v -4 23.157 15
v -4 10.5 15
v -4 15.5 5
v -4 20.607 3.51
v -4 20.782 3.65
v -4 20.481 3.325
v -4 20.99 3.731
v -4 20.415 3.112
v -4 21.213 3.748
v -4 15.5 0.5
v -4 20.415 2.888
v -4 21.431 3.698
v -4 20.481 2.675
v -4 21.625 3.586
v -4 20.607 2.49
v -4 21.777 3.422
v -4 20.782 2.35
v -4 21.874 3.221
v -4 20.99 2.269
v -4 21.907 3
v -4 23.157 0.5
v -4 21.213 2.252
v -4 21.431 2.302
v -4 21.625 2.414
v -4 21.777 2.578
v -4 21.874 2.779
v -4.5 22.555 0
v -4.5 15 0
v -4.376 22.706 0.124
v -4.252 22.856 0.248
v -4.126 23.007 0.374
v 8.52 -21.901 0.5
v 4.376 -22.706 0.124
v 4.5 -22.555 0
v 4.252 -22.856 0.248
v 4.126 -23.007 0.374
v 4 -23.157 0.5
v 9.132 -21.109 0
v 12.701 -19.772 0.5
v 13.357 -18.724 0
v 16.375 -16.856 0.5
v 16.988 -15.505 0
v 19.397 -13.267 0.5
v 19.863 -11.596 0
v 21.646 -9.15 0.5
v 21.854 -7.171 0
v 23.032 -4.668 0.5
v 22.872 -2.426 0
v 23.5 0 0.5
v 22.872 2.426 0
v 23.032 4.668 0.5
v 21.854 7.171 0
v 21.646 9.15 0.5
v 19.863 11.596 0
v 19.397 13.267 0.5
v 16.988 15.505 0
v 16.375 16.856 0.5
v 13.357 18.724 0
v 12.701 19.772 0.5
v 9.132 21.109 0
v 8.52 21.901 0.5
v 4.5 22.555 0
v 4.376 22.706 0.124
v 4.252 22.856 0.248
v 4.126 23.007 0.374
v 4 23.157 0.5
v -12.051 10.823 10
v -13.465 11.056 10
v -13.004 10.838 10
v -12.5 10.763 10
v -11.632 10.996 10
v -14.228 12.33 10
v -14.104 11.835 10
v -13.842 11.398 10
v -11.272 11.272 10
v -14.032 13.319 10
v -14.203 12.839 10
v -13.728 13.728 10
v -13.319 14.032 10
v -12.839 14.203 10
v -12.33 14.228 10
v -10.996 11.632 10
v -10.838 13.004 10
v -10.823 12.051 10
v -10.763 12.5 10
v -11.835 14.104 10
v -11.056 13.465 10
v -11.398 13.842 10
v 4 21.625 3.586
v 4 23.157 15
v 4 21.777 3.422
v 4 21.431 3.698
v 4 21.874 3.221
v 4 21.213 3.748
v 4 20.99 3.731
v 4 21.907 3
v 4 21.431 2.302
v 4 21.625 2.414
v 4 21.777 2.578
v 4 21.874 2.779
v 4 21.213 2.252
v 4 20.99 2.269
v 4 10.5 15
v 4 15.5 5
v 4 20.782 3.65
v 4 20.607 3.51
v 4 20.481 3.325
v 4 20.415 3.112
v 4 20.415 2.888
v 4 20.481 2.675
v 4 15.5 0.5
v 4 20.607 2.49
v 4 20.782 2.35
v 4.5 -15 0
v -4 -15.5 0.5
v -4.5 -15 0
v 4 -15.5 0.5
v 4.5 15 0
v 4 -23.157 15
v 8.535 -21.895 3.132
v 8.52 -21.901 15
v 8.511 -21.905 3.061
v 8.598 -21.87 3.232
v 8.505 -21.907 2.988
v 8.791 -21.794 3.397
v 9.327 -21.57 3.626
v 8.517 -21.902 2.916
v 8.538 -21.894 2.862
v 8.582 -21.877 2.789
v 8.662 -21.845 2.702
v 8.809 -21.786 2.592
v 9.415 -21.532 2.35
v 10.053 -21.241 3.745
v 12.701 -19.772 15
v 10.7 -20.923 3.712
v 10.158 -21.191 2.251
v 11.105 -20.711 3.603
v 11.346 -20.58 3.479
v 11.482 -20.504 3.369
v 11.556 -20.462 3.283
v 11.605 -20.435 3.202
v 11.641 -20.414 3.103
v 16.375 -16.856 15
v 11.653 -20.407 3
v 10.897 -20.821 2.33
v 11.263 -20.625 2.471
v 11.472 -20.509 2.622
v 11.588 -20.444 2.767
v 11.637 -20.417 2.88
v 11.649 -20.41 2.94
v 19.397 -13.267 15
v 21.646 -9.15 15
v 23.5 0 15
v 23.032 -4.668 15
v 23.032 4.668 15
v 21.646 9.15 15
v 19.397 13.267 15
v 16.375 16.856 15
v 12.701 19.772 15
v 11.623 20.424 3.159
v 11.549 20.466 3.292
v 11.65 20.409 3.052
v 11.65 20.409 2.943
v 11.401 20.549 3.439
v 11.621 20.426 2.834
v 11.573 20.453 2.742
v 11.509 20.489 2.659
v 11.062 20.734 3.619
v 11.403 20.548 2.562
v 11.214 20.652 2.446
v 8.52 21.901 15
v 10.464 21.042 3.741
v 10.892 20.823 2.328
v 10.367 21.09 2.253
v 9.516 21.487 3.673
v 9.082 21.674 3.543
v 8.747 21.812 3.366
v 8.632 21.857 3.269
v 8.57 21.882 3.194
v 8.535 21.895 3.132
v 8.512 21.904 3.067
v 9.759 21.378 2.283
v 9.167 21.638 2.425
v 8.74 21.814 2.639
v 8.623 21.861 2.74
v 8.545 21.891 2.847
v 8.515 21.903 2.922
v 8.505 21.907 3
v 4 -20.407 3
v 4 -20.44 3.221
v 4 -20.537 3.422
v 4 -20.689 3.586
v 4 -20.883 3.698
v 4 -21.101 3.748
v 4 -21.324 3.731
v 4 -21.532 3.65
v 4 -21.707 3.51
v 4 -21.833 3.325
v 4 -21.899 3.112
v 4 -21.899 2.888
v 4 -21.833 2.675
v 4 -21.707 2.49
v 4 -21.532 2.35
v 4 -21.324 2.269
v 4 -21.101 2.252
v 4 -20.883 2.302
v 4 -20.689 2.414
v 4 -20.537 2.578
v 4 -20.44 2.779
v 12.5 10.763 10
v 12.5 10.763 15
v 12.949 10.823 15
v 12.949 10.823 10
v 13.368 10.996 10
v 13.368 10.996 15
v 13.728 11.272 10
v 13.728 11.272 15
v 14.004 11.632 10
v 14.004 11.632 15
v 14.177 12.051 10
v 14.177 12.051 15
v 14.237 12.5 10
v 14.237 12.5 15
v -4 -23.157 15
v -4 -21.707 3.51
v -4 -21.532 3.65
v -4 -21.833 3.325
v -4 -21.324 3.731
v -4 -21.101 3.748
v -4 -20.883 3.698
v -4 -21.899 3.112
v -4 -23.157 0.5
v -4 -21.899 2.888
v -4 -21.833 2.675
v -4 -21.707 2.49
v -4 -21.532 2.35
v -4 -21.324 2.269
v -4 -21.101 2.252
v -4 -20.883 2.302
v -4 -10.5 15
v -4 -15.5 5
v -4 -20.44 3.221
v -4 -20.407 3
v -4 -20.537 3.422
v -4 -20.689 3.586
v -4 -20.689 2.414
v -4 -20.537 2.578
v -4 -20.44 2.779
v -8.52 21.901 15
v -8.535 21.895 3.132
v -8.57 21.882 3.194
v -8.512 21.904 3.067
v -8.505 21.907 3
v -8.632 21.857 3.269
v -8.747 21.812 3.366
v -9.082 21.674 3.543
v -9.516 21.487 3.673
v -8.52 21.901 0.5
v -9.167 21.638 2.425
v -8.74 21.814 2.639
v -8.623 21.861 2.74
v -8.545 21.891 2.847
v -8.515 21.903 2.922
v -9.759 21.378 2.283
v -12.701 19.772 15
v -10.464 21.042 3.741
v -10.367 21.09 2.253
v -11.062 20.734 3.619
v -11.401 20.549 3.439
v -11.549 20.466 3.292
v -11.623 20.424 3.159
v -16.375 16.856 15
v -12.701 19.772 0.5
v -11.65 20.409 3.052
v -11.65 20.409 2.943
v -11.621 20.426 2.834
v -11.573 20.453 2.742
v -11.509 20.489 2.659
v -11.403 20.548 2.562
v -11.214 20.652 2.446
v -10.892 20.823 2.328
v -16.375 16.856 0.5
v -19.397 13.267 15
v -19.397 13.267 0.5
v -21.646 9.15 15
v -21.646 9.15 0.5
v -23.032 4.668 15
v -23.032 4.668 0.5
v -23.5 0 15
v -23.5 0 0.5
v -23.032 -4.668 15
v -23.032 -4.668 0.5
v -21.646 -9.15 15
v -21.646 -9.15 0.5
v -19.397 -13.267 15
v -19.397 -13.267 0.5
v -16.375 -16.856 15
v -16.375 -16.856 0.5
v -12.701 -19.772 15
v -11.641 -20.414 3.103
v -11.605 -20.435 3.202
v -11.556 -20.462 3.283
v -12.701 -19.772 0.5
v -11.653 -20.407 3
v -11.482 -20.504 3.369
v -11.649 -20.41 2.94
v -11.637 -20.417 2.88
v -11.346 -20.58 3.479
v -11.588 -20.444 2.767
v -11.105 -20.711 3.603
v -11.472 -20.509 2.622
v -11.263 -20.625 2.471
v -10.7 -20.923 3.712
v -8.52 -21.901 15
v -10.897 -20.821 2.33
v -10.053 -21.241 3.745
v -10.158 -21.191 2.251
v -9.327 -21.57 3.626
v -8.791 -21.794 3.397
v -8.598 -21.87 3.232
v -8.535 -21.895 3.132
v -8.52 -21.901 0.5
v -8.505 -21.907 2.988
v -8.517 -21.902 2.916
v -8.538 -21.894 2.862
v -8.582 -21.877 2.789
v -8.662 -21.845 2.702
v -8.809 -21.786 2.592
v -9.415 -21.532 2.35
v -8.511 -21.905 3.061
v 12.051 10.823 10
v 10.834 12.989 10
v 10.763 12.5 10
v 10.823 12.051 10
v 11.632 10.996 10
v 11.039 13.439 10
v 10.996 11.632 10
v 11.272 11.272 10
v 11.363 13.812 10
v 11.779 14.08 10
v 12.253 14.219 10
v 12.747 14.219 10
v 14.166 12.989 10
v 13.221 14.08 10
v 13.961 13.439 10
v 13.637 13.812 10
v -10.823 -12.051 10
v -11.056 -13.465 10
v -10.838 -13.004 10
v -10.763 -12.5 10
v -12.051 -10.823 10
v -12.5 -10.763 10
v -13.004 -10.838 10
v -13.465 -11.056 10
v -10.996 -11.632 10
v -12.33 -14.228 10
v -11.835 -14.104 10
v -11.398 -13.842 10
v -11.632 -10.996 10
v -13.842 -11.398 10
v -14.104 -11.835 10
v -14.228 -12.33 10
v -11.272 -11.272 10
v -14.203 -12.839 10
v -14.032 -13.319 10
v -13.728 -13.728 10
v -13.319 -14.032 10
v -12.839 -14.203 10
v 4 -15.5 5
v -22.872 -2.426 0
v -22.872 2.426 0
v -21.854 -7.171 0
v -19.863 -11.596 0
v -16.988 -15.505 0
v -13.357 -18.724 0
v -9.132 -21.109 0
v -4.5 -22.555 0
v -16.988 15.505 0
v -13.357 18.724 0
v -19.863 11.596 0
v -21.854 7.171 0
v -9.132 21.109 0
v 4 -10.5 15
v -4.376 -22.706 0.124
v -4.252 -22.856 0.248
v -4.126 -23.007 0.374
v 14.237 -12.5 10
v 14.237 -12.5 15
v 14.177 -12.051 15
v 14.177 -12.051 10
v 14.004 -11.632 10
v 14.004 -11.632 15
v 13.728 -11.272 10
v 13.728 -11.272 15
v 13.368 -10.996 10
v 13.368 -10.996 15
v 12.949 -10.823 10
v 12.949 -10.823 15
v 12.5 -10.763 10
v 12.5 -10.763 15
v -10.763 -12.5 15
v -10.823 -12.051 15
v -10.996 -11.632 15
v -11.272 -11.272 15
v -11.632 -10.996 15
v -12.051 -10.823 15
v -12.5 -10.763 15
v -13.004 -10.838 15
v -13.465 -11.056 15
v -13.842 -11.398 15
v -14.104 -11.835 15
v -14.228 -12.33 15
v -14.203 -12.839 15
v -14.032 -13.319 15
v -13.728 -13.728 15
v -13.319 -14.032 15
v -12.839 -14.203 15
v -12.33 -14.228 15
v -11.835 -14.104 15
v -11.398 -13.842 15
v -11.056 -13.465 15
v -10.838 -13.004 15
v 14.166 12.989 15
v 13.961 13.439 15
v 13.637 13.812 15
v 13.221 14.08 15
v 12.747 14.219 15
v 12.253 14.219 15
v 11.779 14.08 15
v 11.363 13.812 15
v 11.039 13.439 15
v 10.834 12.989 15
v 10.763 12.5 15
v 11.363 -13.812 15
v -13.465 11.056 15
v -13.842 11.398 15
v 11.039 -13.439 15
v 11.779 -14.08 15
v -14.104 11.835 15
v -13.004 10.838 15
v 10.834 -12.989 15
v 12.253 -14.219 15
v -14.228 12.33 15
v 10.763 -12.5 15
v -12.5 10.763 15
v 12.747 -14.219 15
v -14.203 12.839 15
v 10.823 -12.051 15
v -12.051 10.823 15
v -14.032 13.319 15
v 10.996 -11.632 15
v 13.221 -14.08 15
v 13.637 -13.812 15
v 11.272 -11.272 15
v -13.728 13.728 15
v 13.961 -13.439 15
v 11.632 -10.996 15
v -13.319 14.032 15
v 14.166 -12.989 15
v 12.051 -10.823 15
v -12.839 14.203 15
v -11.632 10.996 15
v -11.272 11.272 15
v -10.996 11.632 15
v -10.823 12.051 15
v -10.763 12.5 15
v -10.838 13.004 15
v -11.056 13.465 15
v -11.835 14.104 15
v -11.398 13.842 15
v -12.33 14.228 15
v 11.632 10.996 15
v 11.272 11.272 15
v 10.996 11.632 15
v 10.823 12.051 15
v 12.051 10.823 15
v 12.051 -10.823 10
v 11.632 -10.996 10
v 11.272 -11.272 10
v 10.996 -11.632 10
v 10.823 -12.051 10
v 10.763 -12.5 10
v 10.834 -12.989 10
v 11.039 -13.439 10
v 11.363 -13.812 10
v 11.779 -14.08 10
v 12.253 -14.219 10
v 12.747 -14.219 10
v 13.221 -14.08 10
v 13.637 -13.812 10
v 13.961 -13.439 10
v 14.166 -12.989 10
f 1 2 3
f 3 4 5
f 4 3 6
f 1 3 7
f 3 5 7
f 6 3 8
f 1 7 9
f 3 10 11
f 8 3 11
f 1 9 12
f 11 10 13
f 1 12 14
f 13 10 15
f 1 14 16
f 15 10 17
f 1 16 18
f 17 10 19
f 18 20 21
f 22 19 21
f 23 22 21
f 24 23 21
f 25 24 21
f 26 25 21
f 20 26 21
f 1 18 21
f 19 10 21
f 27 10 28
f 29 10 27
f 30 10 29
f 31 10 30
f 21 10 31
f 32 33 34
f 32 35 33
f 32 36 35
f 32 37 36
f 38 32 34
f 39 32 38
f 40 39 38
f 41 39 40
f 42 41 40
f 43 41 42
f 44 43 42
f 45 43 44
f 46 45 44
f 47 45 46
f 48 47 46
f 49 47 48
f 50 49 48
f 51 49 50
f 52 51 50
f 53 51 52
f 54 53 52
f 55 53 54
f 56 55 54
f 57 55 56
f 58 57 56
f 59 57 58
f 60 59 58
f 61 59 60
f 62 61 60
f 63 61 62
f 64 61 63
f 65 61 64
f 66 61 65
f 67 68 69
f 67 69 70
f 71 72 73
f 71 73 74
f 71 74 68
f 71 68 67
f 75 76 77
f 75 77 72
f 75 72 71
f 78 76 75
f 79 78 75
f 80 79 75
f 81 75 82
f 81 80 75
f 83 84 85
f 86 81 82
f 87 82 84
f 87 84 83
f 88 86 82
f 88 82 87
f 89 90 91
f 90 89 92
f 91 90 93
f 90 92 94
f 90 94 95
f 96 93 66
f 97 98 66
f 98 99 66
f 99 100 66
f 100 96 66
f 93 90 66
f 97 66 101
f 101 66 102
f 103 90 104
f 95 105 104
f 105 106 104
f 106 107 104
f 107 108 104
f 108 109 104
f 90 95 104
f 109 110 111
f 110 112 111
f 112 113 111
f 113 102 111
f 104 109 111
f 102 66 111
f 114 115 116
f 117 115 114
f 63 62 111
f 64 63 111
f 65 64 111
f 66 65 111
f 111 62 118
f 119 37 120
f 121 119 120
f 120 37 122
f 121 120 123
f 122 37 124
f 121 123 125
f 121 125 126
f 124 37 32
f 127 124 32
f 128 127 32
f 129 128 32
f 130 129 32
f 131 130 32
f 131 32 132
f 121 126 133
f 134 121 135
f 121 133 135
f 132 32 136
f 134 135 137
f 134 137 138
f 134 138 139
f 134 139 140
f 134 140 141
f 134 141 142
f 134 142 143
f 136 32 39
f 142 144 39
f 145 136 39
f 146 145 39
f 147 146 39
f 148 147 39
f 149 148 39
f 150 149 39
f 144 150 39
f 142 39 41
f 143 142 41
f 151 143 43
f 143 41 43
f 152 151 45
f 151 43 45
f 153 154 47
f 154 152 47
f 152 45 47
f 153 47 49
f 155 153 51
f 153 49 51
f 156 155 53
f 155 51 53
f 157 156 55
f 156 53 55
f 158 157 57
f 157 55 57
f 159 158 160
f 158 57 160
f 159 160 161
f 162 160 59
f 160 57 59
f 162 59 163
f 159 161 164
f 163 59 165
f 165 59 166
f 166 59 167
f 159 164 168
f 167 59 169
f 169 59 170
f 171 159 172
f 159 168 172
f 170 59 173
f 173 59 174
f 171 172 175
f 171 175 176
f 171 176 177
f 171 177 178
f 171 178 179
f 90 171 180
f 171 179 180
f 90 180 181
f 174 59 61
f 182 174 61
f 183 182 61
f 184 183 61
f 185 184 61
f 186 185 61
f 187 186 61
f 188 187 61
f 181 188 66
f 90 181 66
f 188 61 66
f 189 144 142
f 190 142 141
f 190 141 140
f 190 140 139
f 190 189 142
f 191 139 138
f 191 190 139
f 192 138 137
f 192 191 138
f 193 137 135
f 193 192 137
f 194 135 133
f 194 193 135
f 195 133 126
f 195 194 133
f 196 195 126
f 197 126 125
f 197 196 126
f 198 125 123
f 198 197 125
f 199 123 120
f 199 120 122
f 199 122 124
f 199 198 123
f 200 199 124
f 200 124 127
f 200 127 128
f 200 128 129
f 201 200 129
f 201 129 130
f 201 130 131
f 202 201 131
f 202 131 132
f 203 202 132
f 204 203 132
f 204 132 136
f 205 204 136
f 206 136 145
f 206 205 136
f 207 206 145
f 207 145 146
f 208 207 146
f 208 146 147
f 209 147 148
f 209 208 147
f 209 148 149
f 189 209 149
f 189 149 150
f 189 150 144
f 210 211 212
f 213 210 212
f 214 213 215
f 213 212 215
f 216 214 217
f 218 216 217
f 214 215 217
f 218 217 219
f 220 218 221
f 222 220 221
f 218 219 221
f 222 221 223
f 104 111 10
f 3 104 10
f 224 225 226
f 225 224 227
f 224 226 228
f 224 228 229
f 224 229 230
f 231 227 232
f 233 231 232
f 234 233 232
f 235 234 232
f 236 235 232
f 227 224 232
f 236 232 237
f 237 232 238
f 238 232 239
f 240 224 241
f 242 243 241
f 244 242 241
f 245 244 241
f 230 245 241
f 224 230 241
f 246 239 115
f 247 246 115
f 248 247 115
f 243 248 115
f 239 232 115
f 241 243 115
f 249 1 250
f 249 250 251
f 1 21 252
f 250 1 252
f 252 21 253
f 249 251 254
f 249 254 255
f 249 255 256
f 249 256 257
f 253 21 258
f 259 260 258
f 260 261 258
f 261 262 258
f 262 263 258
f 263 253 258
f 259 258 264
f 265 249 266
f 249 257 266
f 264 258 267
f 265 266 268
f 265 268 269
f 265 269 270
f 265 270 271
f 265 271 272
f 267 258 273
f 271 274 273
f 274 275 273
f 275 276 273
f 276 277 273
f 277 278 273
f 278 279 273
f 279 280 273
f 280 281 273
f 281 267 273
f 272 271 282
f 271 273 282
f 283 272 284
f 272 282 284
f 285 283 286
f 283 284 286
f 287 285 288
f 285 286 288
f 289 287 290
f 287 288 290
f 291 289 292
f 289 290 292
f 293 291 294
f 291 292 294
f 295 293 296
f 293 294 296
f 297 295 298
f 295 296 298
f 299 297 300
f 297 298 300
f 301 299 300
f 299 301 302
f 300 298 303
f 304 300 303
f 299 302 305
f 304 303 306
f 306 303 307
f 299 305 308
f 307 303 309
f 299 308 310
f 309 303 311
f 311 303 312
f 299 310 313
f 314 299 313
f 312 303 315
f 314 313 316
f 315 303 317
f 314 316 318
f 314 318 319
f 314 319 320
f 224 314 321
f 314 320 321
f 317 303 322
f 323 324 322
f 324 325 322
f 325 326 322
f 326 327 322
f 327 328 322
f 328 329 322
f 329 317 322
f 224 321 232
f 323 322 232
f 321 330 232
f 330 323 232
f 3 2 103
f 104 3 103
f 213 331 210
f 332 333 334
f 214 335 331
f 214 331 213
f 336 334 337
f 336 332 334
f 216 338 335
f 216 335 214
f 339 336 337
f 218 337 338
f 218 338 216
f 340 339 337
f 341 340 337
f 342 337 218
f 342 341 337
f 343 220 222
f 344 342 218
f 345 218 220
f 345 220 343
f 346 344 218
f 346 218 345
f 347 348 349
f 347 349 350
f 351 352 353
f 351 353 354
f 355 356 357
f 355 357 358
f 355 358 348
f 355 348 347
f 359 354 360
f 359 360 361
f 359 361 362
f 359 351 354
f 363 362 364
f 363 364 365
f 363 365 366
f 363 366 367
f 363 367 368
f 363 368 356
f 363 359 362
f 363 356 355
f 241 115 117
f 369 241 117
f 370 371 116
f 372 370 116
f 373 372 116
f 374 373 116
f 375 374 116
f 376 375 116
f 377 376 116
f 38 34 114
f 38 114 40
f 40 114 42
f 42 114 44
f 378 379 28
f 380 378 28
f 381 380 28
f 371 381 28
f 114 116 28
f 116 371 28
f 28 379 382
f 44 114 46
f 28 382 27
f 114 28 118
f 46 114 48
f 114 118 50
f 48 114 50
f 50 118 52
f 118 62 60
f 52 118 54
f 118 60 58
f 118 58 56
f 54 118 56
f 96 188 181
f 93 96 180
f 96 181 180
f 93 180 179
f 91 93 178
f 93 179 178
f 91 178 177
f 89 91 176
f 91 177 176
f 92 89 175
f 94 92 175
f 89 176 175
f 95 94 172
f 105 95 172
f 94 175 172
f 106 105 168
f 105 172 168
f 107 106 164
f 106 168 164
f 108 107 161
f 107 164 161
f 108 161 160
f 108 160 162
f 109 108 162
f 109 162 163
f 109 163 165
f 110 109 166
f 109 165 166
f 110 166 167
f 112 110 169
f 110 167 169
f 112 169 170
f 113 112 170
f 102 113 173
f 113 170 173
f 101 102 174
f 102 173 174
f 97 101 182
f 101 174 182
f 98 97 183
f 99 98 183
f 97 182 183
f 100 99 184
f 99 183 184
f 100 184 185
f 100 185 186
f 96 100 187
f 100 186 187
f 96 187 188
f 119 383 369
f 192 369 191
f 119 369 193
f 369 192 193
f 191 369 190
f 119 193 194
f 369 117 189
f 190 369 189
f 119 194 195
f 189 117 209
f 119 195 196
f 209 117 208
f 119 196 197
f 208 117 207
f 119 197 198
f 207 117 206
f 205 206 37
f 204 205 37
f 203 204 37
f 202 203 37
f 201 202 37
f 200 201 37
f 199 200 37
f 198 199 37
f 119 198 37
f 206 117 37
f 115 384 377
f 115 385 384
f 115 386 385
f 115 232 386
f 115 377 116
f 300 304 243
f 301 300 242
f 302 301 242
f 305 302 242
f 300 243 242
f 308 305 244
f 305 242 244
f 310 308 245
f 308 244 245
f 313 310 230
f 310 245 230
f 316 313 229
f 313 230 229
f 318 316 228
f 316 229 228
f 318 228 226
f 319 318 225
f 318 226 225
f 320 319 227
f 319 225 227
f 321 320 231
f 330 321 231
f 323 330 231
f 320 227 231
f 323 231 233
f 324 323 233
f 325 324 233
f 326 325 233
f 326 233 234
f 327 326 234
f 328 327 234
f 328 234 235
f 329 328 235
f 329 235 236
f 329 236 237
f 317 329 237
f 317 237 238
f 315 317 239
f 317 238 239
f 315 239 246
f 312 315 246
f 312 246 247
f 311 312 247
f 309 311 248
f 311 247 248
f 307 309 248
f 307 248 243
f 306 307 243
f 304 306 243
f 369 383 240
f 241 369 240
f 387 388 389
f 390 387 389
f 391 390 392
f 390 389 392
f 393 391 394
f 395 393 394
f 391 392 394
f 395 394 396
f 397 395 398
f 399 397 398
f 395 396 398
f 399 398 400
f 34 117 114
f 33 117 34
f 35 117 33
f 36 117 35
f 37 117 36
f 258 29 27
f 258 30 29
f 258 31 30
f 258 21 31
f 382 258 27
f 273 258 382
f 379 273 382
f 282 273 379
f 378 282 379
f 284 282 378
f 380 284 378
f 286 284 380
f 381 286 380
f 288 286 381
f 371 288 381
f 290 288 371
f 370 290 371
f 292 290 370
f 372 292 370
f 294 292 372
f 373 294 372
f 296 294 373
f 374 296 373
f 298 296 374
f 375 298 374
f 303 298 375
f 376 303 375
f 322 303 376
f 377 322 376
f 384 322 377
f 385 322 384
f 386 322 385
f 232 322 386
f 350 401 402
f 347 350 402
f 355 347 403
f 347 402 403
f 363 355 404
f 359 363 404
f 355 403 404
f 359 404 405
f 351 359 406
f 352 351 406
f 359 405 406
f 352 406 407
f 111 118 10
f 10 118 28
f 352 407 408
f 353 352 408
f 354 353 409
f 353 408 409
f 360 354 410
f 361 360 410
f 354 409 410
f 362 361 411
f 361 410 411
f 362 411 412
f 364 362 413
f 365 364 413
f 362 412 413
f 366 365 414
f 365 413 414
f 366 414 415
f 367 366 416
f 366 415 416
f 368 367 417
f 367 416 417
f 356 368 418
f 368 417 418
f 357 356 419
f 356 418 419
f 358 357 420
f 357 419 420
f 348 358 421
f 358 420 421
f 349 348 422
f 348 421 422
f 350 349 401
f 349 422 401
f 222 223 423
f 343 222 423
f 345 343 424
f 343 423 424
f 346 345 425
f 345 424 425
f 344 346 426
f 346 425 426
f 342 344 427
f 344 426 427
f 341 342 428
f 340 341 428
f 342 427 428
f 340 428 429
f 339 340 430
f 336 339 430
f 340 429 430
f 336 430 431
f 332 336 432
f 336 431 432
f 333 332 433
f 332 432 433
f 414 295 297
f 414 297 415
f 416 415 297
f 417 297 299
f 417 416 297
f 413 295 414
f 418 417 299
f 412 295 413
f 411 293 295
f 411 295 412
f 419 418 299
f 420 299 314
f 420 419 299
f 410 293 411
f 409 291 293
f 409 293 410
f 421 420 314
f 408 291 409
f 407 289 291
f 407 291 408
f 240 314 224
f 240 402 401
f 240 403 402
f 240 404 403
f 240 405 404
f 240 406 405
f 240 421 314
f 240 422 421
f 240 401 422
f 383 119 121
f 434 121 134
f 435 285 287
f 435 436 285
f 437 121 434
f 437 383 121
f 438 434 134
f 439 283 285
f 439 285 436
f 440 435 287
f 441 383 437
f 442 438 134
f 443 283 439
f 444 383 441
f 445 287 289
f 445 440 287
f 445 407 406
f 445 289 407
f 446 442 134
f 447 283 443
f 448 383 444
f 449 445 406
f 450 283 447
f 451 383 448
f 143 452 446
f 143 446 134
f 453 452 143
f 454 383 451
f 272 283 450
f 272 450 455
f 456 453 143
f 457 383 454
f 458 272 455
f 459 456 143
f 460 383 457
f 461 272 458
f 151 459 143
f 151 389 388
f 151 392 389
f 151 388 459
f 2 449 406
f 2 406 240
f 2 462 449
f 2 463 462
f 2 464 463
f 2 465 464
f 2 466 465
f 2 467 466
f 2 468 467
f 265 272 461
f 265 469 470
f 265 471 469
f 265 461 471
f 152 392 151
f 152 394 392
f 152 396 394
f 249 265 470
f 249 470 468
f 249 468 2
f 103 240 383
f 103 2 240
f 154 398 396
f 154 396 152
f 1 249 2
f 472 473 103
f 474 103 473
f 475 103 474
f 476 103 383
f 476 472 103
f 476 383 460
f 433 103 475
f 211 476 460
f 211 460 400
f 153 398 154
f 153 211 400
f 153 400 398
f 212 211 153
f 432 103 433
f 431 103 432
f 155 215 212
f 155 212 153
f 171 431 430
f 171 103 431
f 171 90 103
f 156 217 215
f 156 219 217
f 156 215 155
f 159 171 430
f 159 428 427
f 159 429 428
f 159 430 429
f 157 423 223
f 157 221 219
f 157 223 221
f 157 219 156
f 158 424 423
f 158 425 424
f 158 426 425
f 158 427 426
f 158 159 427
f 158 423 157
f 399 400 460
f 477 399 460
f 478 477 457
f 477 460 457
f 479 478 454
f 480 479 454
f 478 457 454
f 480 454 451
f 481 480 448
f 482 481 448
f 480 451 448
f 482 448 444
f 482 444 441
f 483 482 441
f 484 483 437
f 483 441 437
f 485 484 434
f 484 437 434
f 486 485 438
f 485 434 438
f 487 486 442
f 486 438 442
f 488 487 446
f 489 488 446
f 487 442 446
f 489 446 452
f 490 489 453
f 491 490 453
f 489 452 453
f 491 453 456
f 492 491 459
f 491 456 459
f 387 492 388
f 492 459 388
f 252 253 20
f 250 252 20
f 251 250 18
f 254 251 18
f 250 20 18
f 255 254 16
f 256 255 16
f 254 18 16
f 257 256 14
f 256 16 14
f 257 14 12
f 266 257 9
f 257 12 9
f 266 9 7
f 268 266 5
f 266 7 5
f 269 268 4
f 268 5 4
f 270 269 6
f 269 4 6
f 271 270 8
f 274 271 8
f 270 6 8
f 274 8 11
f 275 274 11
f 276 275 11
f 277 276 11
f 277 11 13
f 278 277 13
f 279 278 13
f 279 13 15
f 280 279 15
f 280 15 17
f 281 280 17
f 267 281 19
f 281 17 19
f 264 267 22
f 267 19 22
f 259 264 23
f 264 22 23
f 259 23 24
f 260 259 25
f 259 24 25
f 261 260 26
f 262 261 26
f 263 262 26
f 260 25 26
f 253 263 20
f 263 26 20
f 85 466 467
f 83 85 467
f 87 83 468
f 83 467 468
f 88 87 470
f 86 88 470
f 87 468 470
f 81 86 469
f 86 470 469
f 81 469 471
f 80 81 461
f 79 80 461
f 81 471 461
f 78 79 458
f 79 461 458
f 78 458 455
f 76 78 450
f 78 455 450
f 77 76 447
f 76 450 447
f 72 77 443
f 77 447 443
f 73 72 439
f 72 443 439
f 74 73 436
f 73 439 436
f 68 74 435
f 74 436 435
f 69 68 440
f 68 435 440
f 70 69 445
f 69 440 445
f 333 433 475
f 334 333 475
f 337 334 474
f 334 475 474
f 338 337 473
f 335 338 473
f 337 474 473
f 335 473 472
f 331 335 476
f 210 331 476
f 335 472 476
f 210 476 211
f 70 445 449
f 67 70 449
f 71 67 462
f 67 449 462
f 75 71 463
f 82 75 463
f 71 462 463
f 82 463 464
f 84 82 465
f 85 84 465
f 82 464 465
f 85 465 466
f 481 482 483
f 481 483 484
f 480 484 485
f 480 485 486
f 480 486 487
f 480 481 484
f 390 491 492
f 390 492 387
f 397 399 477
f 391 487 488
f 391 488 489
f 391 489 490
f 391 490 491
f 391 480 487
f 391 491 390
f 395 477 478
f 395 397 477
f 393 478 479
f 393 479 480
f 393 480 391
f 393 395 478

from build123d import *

# Parameters (mm, degrees)
F0_R      = 23.5
F1_DEPTH  = 15
F3_DEPTH  = 25
F4_SIZE2  = 5
F4_SIZE   = 10
F5_SIZE2  = 5
F5_SIZE   = 10
F7_R      = 0.75
F8_DEPTH  = 12.5
F11_DEPTH = 5
F12_SIZE  = 0.5


with BuildPart() as f1:
    # F0 (on Top) → F1 (new body)
    with BuildSketch(Plane.XY):
        Circle(F0_R)
    extrude(amount=F1_DEPTH)

    # F2 (on face) → F3 (cut)
    with BuildSketch(Plane(origin=(0, 0, 0), x_dir=(1, 0, 0), z_dir=(0, 0, -1))):
        with BuildLine():
            ThreePointArc((0, -23.5), (-2.007337, -23.414111), (-4, -23.157072))
            Line((-4, -23.157072), (-4, -23.5))
            Line((-4, -23.5), (0, -23.5))
        make_face()
        with BuildLine():
            Line((4, -23.5), (4, -23.157072))
            ThreePointArc((4, -23.157072), (2.007337, -23.414111), (0, -23.5))
            Line((0, -23.5), (4, -23.5))
        make_face()
        with BuildLine():
            Line((-4, -15.5), (-4, -23.157072))
            ThreePointArc((-4, -23.157072), (-2.007337, -23.414111), (0, -23.5))
            Line((0, -23.5), (0, -15.5))
            Line((0, -15.5), (-4, -15.5))
        make_face()
        with BuildLine():
            ThreePointArc((0, -23.5), (2.007337, -23.414111), (4, -23.157072))
            Line((4, -23.157072), (4, -15.5))
            Line((4, -15.5), (0, -15.5))
            Line((0, -15.5), (0, -23.5))
        make_face()
        with BuildLine():
            ThreePointArc((4, 23.157072), (2.007337, 23.414111), (0, 23.5))
            Line((0, 23.5), (0, 15.5))
            Line((0, 15.5), (4, 15.5))
            Line((4, 15.5), (4, 23.157072))
        make_face()
        with BuildLine():
            Line((0, 15.5), (0, 23.5))
            ThreePointArc((0, 23.5), (-2.007337, 23.414111), (-4, 23.157072))
            Line((-4, 23.157072), (-4, 15.5))
            Line((-4, 15.5), (0, 15.5))
        make_face()
        with BuildLine():
            Line((4, 23.5), (0, 23.5))
            ThreePointArc((0, 23.5), (2.007337, 23.414111), (4, 23.157072))
            Line((4, 23.157072), (4, 23.5))
        make_face()
        with BuildLine():
            ThreePointArc((-4, 23.157072), (-2.007337, 23.414111), (0, 23.5))
            Line((0, 23.5), (-4, 23.5))
            Line((-4, 23.5), (-4, 23.157072))
        make_face()
    extrude(amount=-F3_DEPTH, mode=Mode.SUBTRACT)

    # F4
    f4_edges = [f1.edges().sort_by_distance(p)[0] for p in [
        (0, -15.5, 15),
    ]]
    chamfer(f4_edges, length=F4_SIZE, length2=F4_SIZE2)

    # F5
    f5_edges = [f1.edges().sort_by_distance(p)[0] for p in [
        (0, 15.5, 15),
    ]]
    chamfer(f5_edges, length=F5_SIZE, length2=F5_SIZE2)

    # F7 (on Right) → F8 (cut, symmetric)
    with BuildSketch(Plane.YZ):
        with Locations((-21.157072, 3)):
            Circle(F7_R)
        with Locations((21.157072, 3)):
            Circle(F7_R)
    extrude(amount=F8_DEPTH, both=True, mode=Mode.SUBTRACT)

    # F10 (on face) → F11 (cut)
    with BuildSketch(Plane.XY.offset(15)):
        with BuildLine():
            ThreePointArc((-12.5, 10.763446), (-11.272071, 11.272071), (-10.763446, 12.5))
            Line((-10.763446, 12.5), (-12.5, 12.5))
            Line((-12.5, 12.5), (-12.5, 10.763446))
        make_face()
        with BuildLine():
            Line((-12.5, 12.5), (-10.763446, 12.5))
            ThreePointArc((-10.763446, 12.5), (-13.727929, 13.727929), (-12.5, 10.763446))
            Line((-12.5, 10.763446), (-12.5, 12.5))
        make_face()
        with BuildLine():
            ThreePointArc((-10.763446, -12.5), (-11.272071, -11.272071), (-12.5, -10.763446))
            Line((-12.5, -10.763446), (-12.5, -12.5))
            Line((-12.5, -12.5), (-10.763446, -12.5))
        make_face()
        with BuildLine():
            Line((-12.5, -12.5), (-12.5, -10.763446))
            ThreePointArc((-12.5, -10.763446), (-13.727929, -13.727929), (-10.763446, -12.5))
            Line((-10.763446, -12.5), (-12.5, -12.5))
        make_face()
        with BuildLine():
            Line((12.5, -12.5), (12.5, -10.763446))
            ThreePointArc((12.5, -10.763446), (11.272071, -11.272071), (10.763446, -12.5))
            Line((10.763446, -12.5), (12.5, -12.5))
        make_face()
        with BuildLine():
            Line((12.5, 12.5), (10.763446, 12.5))
            ThreePointArc((10.763446, 12.5), (11.272071, 11.272071), (12.5, 10.763446))
            Line((12.5, 10.763446), (12.5, 12.5))
        make_face()
        with BuildLine():
            ThreePointArc((14.236554, 12.5), (12.5, 14.236554), (10.763446, 12.5))
            Line((10.763446, 12.5), (12.5, 12.5))
            Line((12.5, 12.5), (12.5, 10.763446))
            ThreePointArc((12.5, 10.763446), (13.727929, 11.272071), (14.236554, 12.5))
        make_face()
        with BuildLine():
            ThreePointArc((14.236554, -12.5), (13.727929, -11.272071), (12.5, -10.763446))
            Line((12.5, -10.763446), (12.5, -12.5))
            Line((12.5, -12.5), (10.763446, -12.5))
            ThreePointArc((10.763446, -12.5), (12.5, -14.236554), (14.236554, -12.5))
        make_face()
    extrude(amount=-F11_DEPTH, mode=Mode.SUBTRACT)

    # F12
    f12_edges = [f1.edges().sort_by_distance(p)[0] for p in [
        (23.5, 0, 0),
        (4, 19.328536, 0),
        (0, 15.5, 0),
        (-4, 19.328536, 0),
        (-23.5, 0, 0),
        (-4, -19.328536, 0),
        (0, -15.5, 0),
        (4, -19.328536, 0),
    ]]
    chamfer(f12_edges, length=F12_SIZE)


solid = f1.part
